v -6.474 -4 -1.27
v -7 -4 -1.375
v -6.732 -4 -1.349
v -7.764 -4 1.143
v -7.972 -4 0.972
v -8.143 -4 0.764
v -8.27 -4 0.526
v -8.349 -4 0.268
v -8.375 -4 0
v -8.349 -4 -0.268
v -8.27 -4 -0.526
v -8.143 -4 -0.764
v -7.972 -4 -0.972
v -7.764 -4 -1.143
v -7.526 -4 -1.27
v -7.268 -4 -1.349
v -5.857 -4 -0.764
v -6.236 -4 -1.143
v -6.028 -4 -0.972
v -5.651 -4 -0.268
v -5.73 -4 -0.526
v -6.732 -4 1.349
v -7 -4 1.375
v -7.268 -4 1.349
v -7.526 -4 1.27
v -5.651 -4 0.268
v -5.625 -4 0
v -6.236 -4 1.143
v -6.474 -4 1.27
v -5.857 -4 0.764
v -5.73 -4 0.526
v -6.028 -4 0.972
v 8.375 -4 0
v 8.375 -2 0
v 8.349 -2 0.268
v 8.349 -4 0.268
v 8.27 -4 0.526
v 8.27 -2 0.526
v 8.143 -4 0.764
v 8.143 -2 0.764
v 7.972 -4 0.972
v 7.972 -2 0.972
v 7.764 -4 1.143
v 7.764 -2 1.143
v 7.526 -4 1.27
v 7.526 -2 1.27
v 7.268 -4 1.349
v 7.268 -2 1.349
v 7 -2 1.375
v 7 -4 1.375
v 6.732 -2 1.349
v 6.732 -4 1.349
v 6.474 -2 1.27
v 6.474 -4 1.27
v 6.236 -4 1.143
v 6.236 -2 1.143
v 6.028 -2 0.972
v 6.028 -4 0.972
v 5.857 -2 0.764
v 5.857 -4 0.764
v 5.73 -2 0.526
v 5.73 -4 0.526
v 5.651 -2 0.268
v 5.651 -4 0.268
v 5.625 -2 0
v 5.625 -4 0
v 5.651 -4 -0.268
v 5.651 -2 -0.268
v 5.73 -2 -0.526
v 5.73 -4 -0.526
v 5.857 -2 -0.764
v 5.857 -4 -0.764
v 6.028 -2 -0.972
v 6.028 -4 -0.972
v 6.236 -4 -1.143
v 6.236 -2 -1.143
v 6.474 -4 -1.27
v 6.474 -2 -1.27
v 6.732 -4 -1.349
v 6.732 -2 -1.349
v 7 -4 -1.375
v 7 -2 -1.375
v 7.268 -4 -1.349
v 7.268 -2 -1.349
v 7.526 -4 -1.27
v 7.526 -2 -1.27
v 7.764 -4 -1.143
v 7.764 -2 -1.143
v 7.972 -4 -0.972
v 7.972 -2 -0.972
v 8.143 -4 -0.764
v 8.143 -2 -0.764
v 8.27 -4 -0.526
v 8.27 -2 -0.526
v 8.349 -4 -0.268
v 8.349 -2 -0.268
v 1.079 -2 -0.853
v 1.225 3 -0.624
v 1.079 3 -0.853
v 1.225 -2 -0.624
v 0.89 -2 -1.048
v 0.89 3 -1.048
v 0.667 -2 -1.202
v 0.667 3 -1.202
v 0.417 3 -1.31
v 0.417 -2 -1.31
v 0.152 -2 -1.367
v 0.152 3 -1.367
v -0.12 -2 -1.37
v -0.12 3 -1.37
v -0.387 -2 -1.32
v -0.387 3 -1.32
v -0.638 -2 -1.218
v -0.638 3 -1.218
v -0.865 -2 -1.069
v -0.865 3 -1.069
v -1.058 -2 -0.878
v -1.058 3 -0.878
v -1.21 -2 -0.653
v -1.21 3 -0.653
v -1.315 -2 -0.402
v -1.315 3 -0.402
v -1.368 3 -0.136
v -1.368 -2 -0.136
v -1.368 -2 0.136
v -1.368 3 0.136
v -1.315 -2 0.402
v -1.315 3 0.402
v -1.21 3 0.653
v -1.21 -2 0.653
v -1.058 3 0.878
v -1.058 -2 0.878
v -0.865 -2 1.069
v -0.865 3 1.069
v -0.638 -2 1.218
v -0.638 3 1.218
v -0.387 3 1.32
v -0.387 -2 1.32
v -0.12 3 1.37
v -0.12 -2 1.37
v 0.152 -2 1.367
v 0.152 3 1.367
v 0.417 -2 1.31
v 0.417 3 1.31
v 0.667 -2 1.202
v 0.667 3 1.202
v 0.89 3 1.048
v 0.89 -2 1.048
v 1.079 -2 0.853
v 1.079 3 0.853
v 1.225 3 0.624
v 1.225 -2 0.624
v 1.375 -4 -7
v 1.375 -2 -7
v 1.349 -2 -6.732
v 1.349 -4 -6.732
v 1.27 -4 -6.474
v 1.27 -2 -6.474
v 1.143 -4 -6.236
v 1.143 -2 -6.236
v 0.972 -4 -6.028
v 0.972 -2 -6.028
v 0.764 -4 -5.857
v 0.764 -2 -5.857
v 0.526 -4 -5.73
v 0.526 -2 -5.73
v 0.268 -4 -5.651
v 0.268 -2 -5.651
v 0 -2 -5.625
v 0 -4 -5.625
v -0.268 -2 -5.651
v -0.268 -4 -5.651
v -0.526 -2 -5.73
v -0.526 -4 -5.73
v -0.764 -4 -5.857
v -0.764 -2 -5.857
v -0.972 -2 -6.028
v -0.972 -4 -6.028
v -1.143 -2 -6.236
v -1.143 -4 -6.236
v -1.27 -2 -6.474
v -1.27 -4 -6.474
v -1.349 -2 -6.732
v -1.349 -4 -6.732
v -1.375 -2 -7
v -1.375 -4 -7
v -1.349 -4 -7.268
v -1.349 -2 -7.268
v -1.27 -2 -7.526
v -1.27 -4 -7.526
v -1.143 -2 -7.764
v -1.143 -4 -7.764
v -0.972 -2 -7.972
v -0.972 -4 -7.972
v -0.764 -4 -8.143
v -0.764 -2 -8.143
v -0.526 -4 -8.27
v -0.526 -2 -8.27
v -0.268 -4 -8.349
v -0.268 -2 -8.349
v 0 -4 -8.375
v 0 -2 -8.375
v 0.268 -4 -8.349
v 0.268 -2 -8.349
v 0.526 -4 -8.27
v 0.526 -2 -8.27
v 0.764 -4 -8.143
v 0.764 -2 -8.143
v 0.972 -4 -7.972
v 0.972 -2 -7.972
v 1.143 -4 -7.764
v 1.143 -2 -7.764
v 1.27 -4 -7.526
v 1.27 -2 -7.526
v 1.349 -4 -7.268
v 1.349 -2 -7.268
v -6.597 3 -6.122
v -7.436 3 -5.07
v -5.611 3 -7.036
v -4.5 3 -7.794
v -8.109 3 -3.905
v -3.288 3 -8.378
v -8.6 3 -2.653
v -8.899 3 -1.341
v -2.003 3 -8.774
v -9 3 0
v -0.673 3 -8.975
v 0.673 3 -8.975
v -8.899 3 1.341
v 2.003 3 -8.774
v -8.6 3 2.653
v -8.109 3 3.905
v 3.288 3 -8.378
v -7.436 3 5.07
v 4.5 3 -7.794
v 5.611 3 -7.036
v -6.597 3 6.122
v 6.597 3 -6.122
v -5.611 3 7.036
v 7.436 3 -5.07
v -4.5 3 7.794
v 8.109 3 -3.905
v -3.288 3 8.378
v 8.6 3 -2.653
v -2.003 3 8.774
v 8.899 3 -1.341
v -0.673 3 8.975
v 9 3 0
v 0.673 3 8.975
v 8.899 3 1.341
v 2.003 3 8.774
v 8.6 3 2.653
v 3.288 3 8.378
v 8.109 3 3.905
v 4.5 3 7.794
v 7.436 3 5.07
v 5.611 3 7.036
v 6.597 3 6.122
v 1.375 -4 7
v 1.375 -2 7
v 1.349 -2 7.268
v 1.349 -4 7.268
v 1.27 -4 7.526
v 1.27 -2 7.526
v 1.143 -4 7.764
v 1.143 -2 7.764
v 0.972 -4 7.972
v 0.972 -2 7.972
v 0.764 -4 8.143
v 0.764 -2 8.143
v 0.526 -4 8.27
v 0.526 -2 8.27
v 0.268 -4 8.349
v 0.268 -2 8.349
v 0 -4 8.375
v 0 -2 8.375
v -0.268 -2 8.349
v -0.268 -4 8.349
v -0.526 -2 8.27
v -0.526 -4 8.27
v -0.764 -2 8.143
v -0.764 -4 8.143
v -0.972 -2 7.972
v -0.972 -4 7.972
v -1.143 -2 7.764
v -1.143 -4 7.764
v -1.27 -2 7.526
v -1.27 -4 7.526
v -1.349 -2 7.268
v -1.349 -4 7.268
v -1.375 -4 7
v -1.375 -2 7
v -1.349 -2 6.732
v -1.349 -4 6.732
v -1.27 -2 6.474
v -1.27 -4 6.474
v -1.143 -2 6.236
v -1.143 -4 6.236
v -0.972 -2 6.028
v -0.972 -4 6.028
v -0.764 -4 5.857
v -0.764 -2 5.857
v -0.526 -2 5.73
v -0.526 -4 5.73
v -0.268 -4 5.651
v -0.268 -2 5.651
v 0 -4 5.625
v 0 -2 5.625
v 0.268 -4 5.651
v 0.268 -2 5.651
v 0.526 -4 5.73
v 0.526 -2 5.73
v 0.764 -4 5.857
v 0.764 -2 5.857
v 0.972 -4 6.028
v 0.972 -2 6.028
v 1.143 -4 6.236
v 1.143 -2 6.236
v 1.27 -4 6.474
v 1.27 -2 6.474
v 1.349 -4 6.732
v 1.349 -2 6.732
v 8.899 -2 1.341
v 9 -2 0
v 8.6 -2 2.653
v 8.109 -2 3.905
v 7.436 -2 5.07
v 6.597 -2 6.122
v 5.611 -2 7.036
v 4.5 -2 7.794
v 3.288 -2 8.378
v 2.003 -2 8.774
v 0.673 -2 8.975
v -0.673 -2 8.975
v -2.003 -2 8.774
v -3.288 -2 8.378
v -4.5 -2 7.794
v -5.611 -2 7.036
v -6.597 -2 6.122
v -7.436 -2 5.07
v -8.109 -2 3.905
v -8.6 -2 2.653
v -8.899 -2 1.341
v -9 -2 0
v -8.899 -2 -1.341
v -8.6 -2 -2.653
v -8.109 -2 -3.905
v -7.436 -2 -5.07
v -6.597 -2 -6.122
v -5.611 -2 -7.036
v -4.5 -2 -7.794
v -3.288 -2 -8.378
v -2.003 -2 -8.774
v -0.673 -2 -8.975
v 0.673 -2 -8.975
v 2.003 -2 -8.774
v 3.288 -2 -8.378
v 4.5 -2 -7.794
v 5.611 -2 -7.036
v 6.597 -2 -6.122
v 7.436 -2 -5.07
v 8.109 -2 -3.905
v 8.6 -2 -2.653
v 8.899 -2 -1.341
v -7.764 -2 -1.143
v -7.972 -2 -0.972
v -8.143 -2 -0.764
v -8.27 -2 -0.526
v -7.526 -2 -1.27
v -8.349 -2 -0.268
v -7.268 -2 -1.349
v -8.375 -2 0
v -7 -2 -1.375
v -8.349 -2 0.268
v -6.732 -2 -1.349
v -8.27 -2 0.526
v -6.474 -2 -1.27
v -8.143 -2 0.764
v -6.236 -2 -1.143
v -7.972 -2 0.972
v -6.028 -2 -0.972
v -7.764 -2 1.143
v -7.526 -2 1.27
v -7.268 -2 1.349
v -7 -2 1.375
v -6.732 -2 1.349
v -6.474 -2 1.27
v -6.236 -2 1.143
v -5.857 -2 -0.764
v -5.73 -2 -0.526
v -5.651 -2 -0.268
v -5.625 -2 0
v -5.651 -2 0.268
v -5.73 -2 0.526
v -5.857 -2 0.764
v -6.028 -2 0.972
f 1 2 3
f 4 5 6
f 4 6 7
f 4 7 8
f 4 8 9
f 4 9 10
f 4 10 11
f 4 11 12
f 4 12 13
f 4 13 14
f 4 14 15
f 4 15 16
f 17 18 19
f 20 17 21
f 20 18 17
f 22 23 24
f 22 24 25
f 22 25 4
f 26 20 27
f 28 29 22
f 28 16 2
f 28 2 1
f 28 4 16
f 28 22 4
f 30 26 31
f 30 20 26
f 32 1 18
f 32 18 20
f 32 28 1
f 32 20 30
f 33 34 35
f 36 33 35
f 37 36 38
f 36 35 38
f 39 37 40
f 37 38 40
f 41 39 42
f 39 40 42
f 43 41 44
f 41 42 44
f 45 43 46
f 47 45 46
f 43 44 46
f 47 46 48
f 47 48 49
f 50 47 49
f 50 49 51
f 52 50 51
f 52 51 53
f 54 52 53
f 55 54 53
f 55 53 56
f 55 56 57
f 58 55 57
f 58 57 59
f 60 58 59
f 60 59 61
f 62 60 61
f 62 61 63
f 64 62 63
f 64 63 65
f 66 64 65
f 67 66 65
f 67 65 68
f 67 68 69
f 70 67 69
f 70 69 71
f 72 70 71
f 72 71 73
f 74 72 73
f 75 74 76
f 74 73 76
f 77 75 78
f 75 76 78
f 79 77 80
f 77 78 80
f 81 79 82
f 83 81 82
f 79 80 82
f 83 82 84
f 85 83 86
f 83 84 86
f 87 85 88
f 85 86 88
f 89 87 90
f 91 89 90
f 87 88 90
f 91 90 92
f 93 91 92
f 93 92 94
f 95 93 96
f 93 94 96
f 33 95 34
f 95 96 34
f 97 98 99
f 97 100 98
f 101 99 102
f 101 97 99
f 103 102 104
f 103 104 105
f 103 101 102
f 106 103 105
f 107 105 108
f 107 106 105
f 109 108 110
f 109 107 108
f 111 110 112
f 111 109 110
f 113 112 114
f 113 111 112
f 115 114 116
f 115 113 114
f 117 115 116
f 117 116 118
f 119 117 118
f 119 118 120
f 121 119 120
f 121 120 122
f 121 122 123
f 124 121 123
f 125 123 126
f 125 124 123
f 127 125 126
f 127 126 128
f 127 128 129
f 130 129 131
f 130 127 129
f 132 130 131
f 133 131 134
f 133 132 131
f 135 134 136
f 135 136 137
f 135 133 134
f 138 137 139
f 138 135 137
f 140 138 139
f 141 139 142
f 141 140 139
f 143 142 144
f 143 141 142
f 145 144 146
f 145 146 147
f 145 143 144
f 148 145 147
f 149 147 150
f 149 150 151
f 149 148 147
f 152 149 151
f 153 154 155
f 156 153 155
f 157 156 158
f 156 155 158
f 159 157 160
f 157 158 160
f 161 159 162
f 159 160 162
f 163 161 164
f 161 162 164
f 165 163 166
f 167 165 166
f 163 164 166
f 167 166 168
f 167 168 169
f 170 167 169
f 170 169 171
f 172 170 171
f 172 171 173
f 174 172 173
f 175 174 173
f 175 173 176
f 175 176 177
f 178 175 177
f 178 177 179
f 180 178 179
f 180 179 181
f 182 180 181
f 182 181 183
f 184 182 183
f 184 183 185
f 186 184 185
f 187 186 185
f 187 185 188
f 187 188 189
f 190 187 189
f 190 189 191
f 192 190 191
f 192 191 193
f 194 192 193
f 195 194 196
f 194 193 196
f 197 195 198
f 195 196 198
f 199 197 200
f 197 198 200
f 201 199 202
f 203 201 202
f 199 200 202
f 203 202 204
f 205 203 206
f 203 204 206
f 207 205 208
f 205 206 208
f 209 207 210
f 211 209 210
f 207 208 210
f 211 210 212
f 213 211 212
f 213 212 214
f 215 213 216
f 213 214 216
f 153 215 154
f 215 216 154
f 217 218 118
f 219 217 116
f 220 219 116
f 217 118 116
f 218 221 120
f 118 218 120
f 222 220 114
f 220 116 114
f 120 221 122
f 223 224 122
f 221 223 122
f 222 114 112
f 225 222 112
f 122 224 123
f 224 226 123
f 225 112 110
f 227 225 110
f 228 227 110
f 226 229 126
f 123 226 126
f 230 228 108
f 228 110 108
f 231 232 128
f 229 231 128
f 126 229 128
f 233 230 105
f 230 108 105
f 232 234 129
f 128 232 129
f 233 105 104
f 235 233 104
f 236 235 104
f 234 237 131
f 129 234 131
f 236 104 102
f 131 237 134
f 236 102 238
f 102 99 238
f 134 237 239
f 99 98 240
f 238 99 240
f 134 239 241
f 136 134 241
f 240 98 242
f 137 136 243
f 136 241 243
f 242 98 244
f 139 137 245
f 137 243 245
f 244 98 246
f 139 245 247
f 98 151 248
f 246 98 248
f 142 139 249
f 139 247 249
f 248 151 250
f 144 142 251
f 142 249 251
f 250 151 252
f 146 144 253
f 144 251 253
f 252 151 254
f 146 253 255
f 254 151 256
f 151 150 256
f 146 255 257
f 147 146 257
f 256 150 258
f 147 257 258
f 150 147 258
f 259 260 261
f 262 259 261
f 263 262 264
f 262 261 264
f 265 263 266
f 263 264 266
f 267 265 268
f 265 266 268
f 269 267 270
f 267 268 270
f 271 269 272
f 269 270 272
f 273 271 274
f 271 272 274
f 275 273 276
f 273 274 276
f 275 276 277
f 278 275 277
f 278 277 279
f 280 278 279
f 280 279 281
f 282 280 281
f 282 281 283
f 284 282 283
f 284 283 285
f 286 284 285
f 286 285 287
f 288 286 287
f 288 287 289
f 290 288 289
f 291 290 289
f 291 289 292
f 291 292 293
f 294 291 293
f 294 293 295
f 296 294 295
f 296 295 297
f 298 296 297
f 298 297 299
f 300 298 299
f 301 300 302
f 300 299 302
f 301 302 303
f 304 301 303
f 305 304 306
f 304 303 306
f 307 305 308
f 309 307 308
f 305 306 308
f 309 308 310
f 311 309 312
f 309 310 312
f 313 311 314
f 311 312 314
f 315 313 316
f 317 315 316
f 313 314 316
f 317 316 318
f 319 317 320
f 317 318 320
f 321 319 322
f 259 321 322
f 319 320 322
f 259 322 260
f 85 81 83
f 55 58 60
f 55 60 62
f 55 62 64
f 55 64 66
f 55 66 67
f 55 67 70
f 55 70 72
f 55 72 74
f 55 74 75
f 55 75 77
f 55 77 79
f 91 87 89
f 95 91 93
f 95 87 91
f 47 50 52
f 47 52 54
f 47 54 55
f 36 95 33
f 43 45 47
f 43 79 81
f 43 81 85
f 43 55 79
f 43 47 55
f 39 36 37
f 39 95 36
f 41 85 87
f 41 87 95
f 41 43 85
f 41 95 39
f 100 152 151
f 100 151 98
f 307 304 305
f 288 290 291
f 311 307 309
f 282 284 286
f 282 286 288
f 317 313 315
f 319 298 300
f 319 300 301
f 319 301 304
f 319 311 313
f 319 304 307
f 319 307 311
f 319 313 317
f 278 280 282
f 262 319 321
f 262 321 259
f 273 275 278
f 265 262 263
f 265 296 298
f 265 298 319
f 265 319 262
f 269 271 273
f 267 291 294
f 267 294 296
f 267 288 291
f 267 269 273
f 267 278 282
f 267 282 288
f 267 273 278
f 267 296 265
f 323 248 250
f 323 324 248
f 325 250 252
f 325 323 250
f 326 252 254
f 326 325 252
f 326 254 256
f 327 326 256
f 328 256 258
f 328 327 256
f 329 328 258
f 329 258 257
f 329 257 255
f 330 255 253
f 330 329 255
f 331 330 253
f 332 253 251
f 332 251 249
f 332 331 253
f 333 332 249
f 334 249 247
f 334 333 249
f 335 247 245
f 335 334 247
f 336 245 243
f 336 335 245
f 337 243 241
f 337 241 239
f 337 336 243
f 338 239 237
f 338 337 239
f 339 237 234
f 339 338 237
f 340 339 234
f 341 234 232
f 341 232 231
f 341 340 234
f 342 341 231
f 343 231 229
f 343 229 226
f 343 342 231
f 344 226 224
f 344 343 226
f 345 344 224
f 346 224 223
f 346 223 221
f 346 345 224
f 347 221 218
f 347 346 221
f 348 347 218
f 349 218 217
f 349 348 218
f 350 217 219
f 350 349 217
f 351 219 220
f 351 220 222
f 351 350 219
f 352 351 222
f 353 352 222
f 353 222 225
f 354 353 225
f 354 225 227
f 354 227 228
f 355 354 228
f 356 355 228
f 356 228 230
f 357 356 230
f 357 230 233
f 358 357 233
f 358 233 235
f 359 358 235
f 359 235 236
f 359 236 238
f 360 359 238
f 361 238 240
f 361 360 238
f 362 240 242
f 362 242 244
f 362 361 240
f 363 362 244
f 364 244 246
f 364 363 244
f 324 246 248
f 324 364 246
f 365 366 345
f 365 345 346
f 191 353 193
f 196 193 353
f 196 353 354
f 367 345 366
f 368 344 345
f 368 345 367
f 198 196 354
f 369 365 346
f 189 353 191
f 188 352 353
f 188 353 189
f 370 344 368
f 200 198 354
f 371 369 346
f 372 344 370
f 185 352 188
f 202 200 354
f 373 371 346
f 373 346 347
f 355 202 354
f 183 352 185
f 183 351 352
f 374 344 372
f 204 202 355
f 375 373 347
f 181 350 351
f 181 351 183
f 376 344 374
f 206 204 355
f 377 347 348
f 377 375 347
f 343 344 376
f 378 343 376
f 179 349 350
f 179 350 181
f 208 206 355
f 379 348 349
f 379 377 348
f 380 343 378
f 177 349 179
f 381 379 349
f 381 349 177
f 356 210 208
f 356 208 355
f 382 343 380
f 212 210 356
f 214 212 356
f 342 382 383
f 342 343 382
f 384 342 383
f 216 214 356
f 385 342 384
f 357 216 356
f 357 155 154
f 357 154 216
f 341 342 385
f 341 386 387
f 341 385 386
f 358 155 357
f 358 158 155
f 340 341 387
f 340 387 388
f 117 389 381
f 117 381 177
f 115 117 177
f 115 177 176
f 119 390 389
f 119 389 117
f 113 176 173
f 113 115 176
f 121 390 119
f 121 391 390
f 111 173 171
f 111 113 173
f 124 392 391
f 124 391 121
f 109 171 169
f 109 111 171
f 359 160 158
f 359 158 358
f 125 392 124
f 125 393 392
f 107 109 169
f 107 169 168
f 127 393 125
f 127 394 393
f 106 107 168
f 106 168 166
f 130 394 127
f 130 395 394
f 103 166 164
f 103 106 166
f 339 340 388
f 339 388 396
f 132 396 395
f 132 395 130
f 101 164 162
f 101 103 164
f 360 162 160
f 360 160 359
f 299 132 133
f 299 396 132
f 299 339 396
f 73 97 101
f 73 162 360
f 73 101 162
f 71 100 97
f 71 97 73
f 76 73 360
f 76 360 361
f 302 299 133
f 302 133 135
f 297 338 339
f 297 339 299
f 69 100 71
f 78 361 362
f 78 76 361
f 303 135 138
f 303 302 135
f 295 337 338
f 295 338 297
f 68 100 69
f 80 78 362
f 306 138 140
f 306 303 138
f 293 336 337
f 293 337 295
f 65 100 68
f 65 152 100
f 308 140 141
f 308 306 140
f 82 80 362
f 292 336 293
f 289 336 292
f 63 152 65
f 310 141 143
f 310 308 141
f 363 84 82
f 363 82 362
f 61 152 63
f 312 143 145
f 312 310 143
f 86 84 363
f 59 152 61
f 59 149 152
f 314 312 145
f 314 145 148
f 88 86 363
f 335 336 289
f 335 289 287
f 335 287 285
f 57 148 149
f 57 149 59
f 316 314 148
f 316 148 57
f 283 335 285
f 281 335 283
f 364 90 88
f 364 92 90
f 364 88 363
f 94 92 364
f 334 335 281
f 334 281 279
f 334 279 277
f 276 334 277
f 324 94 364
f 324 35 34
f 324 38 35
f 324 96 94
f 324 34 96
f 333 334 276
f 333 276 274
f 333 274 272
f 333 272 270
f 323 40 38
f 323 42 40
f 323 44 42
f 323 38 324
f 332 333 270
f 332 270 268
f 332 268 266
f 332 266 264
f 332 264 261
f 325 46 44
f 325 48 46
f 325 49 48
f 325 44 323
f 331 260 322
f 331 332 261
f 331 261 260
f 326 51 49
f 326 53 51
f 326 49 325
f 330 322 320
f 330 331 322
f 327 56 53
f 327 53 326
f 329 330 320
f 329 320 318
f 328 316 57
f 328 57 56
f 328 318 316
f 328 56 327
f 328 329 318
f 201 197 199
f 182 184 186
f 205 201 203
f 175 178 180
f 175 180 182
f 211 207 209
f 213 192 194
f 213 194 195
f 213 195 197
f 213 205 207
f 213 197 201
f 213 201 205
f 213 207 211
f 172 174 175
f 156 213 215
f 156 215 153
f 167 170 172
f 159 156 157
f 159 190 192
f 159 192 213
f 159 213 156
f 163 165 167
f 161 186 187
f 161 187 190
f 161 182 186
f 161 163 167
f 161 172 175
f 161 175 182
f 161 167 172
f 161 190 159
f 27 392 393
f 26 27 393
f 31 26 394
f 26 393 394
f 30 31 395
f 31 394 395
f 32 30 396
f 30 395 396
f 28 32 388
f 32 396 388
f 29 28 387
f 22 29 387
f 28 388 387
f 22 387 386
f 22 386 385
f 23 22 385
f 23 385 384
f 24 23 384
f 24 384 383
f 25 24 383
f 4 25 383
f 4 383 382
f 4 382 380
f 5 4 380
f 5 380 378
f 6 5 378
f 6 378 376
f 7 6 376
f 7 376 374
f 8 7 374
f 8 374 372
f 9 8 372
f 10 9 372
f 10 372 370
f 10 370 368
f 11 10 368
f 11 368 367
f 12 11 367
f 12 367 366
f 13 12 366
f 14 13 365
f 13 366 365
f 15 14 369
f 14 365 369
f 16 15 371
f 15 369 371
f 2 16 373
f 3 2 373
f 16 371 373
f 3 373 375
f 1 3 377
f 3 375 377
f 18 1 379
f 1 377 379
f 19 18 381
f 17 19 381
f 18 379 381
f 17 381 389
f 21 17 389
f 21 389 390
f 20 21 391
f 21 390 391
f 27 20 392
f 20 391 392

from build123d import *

# Parameters (mm, degrees)
F0_R     = 9
F0_R_2   = 1.375
F0_R_3   = 4
F1_DEPTH = 2
F2_DEPTH = 4
F3_DEPTH = 3


with BuildPart() as f1:
    # F0 (on Front) → F1 (new body)
    with BuildSketch(Plane.XZ):
        Circle(F0_R)
        with Locations((0, -7)):
            Circle(F0_R_2, mode=Mode.SUBTRACT)
        with Locations((-7, 0)):
            Circle(F0_R_2, mode=Mode.SUBTRACT)
        Circle(F0_R_3, mode=Mode.SUBTRACT)
        with Locations((7, 0)):
            Circle(F0_R_2, mode=Mode.SUBTRACT)
        with Locations((0, 7)):
            Circle(F0_R_2, mode=Mode.SUBTRACT)
        Circle(F0_R_3)
        with BuildLine():
            ThreePointArc((1.2252600864, 0.6239893595), (1.337041065, 0.3208522879), (1.375, 0))
            ThreePointArc((1.375, 0), (1.337041065, -0.3208522879), (1.2252600864, -0.6239893595))
            ThreePointArc((1.2252600864, -0.6239893595), (-1.375, 0), (1.2252600864, 0.6239893595))
        make_face(mode=Mode.SUBTRACT)
        with Locations((0, 7)):
            Circle(F0_R_2)
        with BuildLine():
            ThreePointArc((1.2252600864, -0.6239893595), (1.337041065, -0.3208522879), (1.375, 0))
            ThreePointArc((1.375, 0), (1.337041065, 0.3208522879), (1.2252600864, 0.6239893595))
            Line((1.2252600864, 0.6239893595), (1.2252600864, -0.6239893595))
        make_face()
    extrude(amount=F1_DEPTH)

    # F0 (on Front) → F2 (join)
    with BuildSketch(Plane.XZ):
        with Locations((-7, 0)):
            Circle(F0_R_2)
        with Locations((0, 7)):
            Circle(F0_R_2)
        with Locations((7, 0)):
            Circle(F0_R_2)
        with Locations((0, -7)):
            Circle(F0_R_2)
    extrude(amount=F2_DEPTH)

    # F0 (on Front) → F3 (join)
    with BuildSketch(Plane.XZ):
        Circle(F0_R)
        with Locations((0, -7)):
            Circle(F0_R_2, mode=Mode.SUBTRACT)
        with Locations((-7, 0)):
            Circle(F0_R_2, mode=Mode.SUBTRACT)
        Circle(F0_R_3, mode=Mode.SUBTRACT)
        with Locations((7, 0)):
            Circle(F0_R_2, mode=Mode.SUBTRACT)
        with Locations((0, 7)):
            Circle(F0_R_2, mode=Mode.SUBTRACT)
        Circle(F0_R_3)
        with BuildLine():
            ThreePointArc((1.2252600864, 0.6239893595), (1.337041065, 0.3208522879), (1.375, 0))
            ThreePointArc((1.375, 0), (1.337041065, -0.3208522879), (1.2252600864, -0.6239893595))
            ThreePointArc((1.2252600864, -0.6239893595), (-1.375, 0), (1.2252600864, 0.6239893595))
        make_face(mode=Mode.SUBTRACT)
        with Locations((7, 0)):
            Circle(F0_R_2)
        with Locations((0, 7)):
            Circle(F0_R_2)
        with Locations((-7, 0)):
            Circle(F0_R_2)
        with Locations((0, -7)):
            Circle(F0_R_2)
        with BuildLine():
            ThreePointArc((1.2252600864, -0.6239893595), (1.337041065, -0.3208522879), (1.375, 0))
            ThreePointArc((1.375, 0), (1.337041065, 0.3208522879), (1.2252600864, 0.6239893595))
            Line((1.2252600864, 0.6239893595), (1.2252600864, -0.6239893595))
        make_face()
    extrude(amount=-F3_DEPTH)


solid = f1.part
